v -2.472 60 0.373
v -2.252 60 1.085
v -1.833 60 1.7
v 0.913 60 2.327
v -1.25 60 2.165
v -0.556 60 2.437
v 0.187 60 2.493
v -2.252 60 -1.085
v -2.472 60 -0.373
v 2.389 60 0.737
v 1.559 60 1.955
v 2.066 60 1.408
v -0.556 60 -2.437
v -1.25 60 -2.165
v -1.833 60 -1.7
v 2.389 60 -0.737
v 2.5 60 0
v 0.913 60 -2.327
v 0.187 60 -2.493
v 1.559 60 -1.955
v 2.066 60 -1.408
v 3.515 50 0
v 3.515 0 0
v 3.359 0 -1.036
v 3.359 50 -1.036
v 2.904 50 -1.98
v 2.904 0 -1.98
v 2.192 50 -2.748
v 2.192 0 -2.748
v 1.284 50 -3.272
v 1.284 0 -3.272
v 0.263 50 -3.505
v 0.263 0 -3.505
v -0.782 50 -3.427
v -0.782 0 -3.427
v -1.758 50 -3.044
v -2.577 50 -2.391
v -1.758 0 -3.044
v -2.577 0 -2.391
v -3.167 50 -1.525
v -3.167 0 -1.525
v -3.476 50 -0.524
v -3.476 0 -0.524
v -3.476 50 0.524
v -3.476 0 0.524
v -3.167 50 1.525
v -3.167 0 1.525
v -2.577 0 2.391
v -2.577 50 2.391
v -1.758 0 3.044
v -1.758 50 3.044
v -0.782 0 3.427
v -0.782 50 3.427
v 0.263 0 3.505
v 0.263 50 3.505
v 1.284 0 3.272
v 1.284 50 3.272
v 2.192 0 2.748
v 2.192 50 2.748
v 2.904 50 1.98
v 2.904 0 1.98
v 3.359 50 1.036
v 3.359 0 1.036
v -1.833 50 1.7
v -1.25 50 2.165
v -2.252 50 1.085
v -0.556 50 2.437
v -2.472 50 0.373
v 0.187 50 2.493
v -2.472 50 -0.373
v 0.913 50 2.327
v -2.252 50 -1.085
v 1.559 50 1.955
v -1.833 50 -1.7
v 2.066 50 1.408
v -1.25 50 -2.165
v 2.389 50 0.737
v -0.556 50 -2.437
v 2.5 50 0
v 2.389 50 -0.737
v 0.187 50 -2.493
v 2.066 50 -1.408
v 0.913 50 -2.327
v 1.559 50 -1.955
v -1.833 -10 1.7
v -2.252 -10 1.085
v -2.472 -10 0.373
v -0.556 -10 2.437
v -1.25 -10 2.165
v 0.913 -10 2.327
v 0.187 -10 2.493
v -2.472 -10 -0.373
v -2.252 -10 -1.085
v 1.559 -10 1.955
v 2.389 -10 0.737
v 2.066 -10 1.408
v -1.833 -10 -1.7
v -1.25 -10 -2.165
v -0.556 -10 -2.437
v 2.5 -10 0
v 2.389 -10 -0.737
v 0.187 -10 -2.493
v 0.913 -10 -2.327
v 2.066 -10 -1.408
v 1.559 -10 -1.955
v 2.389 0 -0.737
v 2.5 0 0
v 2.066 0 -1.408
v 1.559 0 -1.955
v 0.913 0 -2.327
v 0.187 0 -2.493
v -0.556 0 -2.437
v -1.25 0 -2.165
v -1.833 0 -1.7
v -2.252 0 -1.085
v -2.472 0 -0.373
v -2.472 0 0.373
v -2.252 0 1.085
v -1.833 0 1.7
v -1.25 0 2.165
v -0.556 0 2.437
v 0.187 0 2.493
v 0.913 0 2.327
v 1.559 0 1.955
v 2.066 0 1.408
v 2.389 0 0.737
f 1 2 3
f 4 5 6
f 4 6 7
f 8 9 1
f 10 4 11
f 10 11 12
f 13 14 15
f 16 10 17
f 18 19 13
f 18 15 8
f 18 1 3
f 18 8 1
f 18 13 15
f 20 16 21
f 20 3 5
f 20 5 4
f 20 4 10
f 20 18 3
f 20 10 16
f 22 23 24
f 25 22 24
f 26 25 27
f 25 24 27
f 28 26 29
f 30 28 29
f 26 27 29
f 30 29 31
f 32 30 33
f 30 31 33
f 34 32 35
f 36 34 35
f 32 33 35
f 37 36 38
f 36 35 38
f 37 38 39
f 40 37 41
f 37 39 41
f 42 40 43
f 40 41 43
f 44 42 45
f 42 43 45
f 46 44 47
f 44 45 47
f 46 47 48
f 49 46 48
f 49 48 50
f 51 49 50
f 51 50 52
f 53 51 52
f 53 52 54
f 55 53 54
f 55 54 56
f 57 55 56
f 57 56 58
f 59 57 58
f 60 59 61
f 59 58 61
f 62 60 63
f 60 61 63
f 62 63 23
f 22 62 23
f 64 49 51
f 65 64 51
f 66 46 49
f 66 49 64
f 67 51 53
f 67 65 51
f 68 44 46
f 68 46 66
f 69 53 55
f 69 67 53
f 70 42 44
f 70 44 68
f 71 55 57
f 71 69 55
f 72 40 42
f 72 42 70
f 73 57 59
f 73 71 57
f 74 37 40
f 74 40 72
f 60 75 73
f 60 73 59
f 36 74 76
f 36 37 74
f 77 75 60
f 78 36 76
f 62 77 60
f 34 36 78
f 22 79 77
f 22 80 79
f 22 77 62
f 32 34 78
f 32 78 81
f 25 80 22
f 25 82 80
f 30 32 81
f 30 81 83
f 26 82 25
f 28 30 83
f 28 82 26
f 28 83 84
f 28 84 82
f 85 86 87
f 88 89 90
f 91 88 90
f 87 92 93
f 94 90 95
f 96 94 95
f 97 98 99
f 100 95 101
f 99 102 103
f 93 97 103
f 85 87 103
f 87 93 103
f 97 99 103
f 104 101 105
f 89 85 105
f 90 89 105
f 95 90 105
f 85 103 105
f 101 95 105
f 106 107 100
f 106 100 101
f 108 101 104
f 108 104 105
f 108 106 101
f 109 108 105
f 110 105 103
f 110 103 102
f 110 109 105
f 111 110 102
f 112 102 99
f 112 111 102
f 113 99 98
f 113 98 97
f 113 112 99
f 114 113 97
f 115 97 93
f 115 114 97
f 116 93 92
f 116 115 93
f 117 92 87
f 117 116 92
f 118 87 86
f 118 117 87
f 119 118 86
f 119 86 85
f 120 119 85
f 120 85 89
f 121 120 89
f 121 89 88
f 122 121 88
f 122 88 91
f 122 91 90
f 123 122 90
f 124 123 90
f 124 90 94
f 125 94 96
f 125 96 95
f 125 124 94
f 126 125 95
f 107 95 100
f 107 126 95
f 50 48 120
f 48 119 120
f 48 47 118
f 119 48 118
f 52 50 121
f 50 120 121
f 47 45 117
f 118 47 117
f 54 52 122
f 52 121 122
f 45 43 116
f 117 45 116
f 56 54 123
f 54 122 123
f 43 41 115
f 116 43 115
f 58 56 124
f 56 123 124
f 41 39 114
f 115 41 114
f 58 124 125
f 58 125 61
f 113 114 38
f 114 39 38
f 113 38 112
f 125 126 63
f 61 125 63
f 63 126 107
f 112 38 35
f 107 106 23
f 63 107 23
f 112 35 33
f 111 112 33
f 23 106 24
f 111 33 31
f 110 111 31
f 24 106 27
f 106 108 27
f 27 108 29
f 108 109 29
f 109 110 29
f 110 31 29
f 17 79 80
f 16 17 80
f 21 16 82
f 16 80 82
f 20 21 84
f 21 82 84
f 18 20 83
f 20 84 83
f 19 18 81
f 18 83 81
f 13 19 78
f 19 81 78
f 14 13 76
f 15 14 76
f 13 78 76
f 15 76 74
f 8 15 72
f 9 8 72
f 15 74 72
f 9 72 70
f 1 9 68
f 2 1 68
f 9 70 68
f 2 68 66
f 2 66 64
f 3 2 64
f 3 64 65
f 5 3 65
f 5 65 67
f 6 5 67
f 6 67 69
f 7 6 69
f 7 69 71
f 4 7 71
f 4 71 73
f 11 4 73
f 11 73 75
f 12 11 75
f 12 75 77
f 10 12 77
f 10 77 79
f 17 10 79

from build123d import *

# Parameters (mm, degrees)
SKETCH1_R           = 3.515
BOSS_EXTRUDE1_DEPTH = 50
SKETCH2_R           = 2.5
BOSS_EXTRUDE2_DEPTH = 10
SKETCH3_R           = 2.5
BOSS_EXTRUDE5_DEPTH = 60


with BuildPart() as part:
    # Sketch1 → Boss-Extrude1 (new body)
    with BuildSketch(Plane(origin=(0, 0, 0), x_dir=(1, 0, 0), z_dir=(0, 1, 0))):
        Circle(SKETCH1_R)
    extrude(amount=BOSS_EXTRUDE1_DEPTH)

    # Sketch2 → Boss-Extrude2 (add)
    with BuildSketch(Plane(origin=(0, 0, 0), x_dir=(1, 0, 0), z_dir=(0, 1, 0))):
        Circle(SKETCH2_R)
    extrude(amount=-BOSS_EXTRUDE2_DEPTH)

    # Sketch3 → Boss-Extrude5 (add)
    with BuildSketch(Plane(origin=(0, 0, 0), x_dir=(1, 0, 0), z_dir=(0, 1, 0))):
        Circle(SKETCH3_R)
    extrude(amount=BOSS_EXTRUDE5_DEPTH)


solid = part.part
